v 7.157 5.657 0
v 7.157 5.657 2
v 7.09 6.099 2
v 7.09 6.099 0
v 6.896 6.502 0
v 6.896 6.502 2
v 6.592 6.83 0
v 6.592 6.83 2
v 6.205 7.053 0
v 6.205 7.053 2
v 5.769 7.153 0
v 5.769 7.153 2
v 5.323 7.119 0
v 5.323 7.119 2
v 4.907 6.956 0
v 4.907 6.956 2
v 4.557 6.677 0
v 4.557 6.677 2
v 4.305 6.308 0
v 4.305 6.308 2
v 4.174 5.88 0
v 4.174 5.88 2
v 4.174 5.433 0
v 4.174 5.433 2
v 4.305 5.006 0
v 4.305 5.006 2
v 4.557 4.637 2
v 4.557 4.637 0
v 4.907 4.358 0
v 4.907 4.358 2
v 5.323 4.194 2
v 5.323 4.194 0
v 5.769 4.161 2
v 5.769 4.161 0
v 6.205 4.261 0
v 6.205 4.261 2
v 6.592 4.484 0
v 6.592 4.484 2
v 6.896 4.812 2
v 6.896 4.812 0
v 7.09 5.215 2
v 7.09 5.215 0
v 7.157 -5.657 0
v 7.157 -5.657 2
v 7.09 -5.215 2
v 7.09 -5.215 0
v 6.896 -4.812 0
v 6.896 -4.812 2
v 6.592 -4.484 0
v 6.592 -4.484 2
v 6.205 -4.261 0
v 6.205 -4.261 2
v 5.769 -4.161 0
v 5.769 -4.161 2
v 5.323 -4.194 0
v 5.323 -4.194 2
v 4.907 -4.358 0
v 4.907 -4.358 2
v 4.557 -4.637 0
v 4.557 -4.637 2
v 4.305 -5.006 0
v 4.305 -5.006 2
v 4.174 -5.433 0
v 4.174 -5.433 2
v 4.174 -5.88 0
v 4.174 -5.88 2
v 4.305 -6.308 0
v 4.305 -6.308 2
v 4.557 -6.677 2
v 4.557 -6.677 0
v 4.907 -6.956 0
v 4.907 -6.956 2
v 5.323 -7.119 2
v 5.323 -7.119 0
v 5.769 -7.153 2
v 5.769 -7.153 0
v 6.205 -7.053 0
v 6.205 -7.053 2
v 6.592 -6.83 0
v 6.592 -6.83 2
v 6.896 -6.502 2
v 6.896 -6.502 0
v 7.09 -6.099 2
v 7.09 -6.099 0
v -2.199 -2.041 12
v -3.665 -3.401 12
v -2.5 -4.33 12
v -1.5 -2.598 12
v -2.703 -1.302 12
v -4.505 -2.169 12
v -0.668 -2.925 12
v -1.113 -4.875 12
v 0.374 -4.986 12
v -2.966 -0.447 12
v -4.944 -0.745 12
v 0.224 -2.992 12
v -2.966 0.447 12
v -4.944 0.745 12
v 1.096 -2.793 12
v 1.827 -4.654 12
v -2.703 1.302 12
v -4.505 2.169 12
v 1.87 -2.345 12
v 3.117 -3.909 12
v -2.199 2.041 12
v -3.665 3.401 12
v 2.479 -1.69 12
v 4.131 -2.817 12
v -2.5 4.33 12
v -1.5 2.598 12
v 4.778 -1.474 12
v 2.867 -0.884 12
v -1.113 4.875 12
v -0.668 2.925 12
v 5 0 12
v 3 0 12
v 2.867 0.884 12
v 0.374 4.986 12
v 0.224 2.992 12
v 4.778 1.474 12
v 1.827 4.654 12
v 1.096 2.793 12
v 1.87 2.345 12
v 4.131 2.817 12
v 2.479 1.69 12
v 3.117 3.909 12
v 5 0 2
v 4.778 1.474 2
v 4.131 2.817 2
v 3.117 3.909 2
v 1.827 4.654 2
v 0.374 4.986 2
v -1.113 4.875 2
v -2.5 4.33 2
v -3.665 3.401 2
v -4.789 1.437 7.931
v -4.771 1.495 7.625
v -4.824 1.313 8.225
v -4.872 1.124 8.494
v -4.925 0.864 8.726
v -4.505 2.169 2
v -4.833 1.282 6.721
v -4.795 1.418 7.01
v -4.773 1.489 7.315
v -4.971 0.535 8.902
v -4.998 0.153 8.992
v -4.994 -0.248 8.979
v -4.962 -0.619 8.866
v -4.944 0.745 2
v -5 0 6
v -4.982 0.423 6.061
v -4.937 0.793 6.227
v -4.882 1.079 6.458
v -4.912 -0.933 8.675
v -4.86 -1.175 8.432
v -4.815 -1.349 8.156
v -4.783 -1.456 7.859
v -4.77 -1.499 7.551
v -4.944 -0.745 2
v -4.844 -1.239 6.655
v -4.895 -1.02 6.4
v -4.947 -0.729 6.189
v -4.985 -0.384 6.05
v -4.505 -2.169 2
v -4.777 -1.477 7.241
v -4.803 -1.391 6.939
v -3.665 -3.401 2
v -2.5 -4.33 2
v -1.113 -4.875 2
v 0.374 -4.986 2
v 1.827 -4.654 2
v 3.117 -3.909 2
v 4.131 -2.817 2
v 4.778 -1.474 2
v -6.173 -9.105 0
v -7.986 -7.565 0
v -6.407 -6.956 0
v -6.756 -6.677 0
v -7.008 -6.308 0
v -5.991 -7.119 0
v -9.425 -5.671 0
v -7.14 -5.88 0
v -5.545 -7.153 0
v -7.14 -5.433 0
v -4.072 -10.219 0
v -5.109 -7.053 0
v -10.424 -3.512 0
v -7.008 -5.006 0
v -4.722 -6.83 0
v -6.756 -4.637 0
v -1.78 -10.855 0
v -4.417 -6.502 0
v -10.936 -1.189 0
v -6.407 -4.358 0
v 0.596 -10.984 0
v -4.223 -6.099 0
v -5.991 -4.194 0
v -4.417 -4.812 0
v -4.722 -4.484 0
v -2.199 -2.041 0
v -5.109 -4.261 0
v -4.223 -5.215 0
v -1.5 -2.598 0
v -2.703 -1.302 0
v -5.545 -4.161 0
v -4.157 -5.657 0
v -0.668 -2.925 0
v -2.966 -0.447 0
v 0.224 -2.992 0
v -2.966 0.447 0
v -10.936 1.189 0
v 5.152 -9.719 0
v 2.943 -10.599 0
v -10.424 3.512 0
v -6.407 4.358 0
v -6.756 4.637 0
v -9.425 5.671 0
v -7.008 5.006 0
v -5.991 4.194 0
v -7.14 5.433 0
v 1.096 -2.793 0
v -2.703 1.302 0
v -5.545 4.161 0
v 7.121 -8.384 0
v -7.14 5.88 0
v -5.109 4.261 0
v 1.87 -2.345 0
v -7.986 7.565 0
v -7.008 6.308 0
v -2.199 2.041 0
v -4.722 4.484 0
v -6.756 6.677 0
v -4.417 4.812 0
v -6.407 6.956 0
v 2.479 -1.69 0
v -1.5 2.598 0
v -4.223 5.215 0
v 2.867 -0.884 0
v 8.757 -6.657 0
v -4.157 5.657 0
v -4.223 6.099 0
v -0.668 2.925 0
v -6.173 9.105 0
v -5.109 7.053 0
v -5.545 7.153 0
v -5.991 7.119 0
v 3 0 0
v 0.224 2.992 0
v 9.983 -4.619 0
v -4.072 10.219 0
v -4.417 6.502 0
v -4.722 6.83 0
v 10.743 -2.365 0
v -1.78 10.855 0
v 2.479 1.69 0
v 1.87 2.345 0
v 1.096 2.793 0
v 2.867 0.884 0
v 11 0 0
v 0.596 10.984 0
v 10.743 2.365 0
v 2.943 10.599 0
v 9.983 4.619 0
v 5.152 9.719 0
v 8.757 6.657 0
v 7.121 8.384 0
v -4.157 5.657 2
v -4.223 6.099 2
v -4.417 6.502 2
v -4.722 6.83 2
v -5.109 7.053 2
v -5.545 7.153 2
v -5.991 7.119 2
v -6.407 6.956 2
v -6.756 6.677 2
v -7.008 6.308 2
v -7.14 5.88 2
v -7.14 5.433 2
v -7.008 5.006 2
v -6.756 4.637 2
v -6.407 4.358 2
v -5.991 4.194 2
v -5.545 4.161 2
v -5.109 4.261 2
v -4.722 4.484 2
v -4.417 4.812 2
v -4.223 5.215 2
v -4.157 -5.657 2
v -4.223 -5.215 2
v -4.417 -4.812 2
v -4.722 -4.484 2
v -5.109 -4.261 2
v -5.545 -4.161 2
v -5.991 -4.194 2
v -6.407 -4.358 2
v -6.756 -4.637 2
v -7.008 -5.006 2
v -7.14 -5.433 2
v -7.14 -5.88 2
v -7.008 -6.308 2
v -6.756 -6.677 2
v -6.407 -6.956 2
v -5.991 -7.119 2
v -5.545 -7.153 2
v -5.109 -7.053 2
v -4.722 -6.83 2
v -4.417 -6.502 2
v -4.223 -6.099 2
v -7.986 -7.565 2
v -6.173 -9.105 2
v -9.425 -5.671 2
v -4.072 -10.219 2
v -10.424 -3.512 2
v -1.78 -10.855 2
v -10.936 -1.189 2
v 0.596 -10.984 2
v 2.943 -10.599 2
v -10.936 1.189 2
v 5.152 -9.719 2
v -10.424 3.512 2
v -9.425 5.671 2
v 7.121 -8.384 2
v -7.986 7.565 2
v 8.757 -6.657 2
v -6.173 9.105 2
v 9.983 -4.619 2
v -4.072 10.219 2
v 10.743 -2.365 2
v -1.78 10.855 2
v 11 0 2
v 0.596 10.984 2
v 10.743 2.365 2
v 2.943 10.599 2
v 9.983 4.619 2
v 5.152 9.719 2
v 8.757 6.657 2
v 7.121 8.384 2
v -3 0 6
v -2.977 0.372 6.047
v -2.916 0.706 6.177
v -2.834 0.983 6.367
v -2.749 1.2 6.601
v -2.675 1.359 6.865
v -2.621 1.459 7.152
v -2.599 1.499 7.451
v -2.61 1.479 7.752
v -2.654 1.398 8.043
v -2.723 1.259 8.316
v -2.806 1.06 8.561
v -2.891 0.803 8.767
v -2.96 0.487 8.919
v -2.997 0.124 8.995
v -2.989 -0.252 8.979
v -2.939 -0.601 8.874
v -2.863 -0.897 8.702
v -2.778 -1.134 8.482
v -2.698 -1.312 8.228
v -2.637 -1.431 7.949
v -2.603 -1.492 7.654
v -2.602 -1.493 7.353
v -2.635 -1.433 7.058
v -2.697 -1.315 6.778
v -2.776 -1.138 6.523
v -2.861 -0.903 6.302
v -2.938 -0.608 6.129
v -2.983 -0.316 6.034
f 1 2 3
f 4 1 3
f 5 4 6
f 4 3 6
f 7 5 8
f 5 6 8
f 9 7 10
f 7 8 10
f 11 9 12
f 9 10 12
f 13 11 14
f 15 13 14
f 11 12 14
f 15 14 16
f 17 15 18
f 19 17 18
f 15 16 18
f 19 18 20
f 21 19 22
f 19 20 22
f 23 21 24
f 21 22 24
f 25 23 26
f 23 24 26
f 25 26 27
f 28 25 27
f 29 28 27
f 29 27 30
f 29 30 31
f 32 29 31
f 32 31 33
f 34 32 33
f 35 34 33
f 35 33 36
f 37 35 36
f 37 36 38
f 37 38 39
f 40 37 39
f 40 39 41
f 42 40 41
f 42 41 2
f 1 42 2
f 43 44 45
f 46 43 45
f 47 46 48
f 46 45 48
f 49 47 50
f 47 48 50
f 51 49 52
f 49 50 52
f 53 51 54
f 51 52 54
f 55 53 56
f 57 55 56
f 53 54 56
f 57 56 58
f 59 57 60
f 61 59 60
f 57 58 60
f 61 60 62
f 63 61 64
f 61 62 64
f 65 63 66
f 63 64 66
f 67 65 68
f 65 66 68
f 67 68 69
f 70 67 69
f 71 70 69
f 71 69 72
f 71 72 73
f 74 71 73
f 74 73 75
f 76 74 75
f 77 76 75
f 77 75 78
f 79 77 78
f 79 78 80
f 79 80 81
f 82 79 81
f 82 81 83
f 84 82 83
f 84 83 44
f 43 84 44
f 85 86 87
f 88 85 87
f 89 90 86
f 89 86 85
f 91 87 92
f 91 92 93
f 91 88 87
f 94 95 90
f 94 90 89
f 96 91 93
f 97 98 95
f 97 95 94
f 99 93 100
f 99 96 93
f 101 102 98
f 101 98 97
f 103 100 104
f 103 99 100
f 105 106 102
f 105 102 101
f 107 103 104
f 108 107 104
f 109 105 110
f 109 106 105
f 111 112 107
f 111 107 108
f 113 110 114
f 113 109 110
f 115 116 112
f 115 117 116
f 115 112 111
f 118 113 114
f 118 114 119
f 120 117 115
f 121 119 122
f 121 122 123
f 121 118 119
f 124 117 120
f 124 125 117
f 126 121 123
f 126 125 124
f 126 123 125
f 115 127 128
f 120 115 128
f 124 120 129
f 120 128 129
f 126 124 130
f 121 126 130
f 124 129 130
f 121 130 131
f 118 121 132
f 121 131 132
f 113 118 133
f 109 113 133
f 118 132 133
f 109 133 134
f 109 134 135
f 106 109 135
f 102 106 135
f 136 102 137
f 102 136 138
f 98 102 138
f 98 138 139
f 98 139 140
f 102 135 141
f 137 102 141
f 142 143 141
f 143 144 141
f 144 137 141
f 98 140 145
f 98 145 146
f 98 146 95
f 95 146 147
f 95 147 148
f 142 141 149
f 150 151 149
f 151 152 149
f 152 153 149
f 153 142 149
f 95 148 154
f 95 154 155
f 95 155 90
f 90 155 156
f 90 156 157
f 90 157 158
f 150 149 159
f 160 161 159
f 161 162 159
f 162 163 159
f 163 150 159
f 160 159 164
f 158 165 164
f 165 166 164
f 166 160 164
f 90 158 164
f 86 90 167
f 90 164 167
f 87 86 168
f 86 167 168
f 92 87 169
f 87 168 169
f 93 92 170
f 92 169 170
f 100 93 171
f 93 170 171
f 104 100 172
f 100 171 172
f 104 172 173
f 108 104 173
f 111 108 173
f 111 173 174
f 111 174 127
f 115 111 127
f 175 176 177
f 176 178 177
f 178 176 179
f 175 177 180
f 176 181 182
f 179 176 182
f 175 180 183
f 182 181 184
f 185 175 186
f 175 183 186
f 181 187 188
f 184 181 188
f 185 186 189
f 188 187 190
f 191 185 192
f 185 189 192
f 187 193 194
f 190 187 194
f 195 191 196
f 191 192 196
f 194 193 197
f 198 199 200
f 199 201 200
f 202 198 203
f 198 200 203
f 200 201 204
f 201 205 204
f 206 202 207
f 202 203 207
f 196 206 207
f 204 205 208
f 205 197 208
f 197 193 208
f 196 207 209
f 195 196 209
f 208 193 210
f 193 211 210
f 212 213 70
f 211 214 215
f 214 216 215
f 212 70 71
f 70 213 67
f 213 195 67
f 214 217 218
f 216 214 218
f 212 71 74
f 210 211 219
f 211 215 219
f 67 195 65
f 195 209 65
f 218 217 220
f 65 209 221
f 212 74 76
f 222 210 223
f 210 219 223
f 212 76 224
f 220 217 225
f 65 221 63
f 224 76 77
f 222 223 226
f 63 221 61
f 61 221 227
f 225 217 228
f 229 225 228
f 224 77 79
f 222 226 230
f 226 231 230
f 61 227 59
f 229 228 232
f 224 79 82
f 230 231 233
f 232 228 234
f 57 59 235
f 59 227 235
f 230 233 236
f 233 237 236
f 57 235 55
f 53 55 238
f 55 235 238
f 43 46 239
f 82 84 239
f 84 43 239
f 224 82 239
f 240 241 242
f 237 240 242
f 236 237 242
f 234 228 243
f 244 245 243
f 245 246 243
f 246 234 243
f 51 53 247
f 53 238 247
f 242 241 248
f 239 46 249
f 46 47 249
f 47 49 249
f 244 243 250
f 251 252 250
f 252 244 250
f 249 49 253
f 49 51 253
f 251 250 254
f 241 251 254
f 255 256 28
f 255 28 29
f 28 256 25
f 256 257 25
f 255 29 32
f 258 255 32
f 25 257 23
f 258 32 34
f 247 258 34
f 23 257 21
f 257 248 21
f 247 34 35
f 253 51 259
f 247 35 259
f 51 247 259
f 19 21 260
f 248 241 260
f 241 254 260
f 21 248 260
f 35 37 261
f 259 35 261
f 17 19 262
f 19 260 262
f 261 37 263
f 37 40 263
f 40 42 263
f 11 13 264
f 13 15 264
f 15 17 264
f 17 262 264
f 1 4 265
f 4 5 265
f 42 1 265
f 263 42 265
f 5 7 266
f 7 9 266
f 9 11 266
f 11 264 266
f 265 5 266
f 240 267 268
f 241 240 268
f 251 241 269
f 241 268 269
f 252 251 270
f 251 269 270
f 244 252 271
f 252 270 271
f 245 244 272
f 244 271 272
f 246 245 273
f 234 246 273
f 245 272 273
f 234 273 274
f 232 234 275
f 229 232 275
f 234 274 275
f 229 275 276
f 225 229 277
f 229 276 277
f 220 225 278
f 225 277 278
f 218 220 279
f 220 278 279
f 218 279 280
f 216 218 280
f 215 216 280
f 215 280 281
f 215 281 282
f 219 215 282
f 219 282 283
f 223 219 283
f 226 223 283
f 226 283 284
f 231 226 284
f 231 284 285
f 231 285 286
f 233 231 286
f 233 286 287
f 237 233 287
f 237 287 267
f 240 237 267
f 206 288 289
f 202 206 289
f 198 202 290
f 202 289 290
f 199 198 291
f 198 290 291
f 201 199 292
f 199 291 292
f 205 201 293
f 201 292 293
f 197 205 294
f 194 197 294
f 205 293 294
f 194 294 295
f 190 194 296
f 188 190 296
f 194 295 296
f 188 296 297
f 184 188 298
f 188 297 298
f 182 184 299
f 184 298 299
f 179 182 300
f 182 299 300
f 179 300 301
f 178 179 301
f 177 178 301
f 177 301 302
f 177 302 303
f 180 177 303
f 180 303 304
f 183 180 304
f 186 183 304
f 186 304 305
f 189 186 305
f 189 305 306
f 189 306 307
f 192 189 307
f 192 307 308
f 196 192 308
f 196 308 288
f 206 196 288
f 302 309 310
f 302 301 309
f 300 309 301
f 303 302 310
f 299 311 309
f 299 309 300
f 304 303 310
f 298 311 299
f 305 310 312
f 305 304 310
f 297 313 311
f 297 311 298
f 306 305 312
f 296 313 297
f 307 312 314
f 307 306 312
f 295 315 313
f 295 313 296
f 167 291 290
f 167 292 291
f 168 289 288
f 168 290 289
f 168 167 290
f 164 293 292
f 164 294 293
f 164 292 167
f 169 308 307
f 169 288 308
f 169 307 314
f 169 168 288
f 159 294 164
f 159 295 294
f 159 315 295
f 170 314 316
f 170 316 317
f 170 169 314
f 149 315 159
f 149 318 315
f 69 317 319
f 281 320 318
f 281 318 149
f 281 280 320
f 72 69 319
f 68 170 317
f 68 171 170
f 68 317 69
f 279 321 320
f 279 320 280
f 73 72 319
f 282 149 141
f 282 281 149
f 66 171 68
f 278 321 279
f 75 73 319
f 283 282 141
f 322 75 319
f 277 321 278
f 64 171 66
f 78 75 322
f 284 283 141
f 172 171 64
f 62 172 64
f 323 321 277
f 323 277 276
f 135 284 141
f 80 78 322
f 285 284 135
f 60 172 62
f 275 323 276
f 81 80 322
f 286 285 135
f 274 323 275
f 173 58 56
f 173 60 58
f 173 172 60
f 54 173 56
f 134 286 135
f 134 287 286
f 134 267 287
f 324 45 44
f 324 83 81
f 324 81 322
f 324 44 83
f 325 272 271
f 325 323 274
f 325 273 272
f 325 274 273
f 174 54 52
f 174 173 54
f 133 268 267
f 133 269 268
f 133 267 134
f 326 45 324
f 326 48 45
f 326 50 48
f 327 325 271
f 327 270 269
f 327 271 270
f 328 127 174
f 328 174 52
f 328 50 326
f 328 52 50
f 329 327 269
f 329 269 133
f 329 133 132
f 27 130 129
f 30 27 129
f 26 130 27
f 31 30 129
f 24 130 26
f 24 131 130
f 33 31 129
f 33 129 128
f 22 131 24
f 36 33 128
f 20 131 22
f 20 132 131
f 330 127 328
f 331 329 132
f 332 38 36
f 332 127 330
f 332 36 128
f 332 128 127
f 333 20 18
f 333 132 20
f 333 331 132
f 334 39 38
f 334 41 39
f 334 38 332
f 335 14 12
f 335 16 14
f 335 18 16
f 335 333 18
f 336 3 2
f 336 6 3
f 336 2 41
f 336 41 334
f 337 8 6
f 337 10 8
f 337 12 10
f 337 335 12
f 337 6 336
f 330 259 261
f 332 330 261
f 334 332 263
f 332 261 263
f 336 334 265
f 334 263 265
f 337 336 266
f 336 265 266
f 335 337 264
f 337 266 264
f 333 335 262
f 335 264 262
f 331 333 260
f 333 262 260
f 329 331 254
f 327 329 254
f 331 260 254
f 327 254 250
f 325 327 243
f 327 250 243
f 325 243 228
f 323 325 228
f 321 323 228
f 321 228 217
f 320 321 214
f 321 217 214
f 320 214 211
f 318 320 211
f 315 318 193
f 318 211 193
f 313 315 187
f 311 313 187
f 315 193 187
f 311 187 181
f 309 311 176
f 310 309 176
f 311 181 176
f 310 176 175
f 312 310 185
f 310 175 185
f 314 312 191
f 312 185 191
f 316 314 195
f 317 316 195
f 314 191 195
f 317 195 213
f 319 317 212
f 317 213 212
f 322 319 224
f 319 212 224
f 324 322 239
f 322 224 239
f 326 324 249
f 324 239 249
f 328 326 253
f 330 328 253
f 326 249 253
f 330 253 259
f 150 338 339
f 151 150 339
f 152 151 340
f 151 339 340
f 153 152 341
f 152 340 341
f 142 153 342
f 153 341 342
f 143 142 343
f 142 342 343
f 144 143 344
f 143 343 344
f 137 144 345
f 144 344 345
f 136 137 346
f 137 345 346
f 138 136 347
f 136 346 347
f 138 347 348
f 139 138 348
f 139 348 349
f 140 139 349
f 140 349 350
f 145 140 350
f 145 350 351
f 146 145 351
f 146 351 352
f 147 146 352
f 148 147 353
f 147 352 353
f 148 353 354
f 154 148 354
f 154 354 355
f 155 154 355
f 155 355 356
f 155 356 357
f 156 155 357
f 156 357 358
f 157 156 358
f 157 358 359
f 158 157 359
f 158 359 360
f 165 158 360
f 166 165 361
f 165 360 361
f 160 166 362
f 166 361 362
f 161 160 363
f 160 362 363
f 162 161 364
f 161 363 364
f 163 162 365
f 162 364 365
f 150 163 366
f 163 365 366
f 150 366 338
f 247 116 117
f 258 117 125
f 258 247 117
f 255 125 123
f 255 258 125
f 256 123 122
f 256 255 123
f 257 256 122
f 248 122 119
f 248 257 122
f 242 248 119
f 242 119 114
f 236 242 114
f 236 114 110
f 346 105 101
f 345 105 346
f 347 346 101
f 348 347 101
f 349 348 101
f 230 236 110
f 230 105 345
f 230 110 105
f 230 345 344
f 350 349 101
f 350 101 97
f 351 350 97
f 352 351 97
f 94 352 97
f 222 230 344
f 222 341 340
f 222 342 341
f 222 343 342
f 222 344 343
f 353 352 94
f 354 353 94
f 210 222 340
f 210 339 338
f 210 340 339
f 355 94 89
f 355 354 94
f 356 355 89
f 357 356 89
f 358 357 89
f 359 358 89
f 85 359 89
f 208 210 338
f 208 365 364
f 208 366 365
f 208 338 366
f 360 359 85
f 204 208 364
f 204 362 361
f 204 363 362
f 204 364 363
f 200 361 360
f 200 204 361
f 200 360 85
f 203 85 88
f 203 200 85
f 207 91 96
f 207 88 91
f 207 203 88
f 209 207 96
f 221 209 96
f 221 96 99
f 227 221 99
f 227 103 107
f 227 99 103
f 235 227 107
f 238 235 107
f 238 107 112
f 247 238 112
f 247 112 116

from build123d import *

# Parameters (mm, degrees)
SKETCH_1_R          = 11
EXTRUDE_1_DEPTH     = 2
SKETCH_2_R          = 5
EXTRUDE_2_DEPTH     = 10
SKETCH_3_R          = 3
CUT_EXTRUDE_2_DEPTH = 13
SKETCH_4_R          = 1.5
CUT_EXTRUDE_3_DEPTH = 10
SKETCH_5_R          = 1.5
CUT_EXTRUDE_4_DEPTH = 12


with BuildPart() as part:
    # Эскиз1 → Бобышка-Вытянуть1 (new body)
    with BuildSketch(Plane.XY):
        Circle(SKETCH_1_R)
    extrude(amount=EXTRUDE_1_DEPTH)

    # Эскиз2 → Бобышка-Вытянуть2 (add)
    with BuildSketch(Plane.XY.offset(2)):
        Circle(SKETCH_2_R)
    extrude(amount=EXTRUDE_2_DEPTH)

    # Эскиз3 → Вырез-Вытянуть2 (cut, through all)
    with BuildSketch(Plane.XY):
        Circle(SKETCH_3_R)
    extrude(amount=CUT_EXTRUDE_2_DEPTH, mode=Mode.SUBTRACT)

    # Эскиз4 → Вырез-Вытянуть3 (cut)
    with BuildSketch(Plane.XY.offset(2)):
        with Locations((5.656854249, 5.656854249)):
            Circle(SKETCH_4_R)
        with Locations((5.656854249, -5.656854249)):
            Circle(SKETCH_4_R)
        with Locations((-5.656854249, -5.656854249)):
            Circle(SKETCH_4_R)
        with Locations((-5.656854249, 5.656854249)):
            Circle(SKETCH_4_R)
    extrude(amount=-CUT_EXTRUDE_3_DEPTH, mode=Mode.SUBTRACT)

    # Эскиз5 → Вырез-Вытянуть4 (cut, through all)
    with BuildSketch(Plane(origin=(0, 0, 0), x_dir=(0, 0, -1), z_dir=(1, 0, 0))):
        with Locations((-7.5, 0)):
            Circle(SKETCH_5_R)
    extrude(amount=-CUT_EXTRUDE_4_DEPTH, mode=Mode.SUBTRACT)


solid = part.part
